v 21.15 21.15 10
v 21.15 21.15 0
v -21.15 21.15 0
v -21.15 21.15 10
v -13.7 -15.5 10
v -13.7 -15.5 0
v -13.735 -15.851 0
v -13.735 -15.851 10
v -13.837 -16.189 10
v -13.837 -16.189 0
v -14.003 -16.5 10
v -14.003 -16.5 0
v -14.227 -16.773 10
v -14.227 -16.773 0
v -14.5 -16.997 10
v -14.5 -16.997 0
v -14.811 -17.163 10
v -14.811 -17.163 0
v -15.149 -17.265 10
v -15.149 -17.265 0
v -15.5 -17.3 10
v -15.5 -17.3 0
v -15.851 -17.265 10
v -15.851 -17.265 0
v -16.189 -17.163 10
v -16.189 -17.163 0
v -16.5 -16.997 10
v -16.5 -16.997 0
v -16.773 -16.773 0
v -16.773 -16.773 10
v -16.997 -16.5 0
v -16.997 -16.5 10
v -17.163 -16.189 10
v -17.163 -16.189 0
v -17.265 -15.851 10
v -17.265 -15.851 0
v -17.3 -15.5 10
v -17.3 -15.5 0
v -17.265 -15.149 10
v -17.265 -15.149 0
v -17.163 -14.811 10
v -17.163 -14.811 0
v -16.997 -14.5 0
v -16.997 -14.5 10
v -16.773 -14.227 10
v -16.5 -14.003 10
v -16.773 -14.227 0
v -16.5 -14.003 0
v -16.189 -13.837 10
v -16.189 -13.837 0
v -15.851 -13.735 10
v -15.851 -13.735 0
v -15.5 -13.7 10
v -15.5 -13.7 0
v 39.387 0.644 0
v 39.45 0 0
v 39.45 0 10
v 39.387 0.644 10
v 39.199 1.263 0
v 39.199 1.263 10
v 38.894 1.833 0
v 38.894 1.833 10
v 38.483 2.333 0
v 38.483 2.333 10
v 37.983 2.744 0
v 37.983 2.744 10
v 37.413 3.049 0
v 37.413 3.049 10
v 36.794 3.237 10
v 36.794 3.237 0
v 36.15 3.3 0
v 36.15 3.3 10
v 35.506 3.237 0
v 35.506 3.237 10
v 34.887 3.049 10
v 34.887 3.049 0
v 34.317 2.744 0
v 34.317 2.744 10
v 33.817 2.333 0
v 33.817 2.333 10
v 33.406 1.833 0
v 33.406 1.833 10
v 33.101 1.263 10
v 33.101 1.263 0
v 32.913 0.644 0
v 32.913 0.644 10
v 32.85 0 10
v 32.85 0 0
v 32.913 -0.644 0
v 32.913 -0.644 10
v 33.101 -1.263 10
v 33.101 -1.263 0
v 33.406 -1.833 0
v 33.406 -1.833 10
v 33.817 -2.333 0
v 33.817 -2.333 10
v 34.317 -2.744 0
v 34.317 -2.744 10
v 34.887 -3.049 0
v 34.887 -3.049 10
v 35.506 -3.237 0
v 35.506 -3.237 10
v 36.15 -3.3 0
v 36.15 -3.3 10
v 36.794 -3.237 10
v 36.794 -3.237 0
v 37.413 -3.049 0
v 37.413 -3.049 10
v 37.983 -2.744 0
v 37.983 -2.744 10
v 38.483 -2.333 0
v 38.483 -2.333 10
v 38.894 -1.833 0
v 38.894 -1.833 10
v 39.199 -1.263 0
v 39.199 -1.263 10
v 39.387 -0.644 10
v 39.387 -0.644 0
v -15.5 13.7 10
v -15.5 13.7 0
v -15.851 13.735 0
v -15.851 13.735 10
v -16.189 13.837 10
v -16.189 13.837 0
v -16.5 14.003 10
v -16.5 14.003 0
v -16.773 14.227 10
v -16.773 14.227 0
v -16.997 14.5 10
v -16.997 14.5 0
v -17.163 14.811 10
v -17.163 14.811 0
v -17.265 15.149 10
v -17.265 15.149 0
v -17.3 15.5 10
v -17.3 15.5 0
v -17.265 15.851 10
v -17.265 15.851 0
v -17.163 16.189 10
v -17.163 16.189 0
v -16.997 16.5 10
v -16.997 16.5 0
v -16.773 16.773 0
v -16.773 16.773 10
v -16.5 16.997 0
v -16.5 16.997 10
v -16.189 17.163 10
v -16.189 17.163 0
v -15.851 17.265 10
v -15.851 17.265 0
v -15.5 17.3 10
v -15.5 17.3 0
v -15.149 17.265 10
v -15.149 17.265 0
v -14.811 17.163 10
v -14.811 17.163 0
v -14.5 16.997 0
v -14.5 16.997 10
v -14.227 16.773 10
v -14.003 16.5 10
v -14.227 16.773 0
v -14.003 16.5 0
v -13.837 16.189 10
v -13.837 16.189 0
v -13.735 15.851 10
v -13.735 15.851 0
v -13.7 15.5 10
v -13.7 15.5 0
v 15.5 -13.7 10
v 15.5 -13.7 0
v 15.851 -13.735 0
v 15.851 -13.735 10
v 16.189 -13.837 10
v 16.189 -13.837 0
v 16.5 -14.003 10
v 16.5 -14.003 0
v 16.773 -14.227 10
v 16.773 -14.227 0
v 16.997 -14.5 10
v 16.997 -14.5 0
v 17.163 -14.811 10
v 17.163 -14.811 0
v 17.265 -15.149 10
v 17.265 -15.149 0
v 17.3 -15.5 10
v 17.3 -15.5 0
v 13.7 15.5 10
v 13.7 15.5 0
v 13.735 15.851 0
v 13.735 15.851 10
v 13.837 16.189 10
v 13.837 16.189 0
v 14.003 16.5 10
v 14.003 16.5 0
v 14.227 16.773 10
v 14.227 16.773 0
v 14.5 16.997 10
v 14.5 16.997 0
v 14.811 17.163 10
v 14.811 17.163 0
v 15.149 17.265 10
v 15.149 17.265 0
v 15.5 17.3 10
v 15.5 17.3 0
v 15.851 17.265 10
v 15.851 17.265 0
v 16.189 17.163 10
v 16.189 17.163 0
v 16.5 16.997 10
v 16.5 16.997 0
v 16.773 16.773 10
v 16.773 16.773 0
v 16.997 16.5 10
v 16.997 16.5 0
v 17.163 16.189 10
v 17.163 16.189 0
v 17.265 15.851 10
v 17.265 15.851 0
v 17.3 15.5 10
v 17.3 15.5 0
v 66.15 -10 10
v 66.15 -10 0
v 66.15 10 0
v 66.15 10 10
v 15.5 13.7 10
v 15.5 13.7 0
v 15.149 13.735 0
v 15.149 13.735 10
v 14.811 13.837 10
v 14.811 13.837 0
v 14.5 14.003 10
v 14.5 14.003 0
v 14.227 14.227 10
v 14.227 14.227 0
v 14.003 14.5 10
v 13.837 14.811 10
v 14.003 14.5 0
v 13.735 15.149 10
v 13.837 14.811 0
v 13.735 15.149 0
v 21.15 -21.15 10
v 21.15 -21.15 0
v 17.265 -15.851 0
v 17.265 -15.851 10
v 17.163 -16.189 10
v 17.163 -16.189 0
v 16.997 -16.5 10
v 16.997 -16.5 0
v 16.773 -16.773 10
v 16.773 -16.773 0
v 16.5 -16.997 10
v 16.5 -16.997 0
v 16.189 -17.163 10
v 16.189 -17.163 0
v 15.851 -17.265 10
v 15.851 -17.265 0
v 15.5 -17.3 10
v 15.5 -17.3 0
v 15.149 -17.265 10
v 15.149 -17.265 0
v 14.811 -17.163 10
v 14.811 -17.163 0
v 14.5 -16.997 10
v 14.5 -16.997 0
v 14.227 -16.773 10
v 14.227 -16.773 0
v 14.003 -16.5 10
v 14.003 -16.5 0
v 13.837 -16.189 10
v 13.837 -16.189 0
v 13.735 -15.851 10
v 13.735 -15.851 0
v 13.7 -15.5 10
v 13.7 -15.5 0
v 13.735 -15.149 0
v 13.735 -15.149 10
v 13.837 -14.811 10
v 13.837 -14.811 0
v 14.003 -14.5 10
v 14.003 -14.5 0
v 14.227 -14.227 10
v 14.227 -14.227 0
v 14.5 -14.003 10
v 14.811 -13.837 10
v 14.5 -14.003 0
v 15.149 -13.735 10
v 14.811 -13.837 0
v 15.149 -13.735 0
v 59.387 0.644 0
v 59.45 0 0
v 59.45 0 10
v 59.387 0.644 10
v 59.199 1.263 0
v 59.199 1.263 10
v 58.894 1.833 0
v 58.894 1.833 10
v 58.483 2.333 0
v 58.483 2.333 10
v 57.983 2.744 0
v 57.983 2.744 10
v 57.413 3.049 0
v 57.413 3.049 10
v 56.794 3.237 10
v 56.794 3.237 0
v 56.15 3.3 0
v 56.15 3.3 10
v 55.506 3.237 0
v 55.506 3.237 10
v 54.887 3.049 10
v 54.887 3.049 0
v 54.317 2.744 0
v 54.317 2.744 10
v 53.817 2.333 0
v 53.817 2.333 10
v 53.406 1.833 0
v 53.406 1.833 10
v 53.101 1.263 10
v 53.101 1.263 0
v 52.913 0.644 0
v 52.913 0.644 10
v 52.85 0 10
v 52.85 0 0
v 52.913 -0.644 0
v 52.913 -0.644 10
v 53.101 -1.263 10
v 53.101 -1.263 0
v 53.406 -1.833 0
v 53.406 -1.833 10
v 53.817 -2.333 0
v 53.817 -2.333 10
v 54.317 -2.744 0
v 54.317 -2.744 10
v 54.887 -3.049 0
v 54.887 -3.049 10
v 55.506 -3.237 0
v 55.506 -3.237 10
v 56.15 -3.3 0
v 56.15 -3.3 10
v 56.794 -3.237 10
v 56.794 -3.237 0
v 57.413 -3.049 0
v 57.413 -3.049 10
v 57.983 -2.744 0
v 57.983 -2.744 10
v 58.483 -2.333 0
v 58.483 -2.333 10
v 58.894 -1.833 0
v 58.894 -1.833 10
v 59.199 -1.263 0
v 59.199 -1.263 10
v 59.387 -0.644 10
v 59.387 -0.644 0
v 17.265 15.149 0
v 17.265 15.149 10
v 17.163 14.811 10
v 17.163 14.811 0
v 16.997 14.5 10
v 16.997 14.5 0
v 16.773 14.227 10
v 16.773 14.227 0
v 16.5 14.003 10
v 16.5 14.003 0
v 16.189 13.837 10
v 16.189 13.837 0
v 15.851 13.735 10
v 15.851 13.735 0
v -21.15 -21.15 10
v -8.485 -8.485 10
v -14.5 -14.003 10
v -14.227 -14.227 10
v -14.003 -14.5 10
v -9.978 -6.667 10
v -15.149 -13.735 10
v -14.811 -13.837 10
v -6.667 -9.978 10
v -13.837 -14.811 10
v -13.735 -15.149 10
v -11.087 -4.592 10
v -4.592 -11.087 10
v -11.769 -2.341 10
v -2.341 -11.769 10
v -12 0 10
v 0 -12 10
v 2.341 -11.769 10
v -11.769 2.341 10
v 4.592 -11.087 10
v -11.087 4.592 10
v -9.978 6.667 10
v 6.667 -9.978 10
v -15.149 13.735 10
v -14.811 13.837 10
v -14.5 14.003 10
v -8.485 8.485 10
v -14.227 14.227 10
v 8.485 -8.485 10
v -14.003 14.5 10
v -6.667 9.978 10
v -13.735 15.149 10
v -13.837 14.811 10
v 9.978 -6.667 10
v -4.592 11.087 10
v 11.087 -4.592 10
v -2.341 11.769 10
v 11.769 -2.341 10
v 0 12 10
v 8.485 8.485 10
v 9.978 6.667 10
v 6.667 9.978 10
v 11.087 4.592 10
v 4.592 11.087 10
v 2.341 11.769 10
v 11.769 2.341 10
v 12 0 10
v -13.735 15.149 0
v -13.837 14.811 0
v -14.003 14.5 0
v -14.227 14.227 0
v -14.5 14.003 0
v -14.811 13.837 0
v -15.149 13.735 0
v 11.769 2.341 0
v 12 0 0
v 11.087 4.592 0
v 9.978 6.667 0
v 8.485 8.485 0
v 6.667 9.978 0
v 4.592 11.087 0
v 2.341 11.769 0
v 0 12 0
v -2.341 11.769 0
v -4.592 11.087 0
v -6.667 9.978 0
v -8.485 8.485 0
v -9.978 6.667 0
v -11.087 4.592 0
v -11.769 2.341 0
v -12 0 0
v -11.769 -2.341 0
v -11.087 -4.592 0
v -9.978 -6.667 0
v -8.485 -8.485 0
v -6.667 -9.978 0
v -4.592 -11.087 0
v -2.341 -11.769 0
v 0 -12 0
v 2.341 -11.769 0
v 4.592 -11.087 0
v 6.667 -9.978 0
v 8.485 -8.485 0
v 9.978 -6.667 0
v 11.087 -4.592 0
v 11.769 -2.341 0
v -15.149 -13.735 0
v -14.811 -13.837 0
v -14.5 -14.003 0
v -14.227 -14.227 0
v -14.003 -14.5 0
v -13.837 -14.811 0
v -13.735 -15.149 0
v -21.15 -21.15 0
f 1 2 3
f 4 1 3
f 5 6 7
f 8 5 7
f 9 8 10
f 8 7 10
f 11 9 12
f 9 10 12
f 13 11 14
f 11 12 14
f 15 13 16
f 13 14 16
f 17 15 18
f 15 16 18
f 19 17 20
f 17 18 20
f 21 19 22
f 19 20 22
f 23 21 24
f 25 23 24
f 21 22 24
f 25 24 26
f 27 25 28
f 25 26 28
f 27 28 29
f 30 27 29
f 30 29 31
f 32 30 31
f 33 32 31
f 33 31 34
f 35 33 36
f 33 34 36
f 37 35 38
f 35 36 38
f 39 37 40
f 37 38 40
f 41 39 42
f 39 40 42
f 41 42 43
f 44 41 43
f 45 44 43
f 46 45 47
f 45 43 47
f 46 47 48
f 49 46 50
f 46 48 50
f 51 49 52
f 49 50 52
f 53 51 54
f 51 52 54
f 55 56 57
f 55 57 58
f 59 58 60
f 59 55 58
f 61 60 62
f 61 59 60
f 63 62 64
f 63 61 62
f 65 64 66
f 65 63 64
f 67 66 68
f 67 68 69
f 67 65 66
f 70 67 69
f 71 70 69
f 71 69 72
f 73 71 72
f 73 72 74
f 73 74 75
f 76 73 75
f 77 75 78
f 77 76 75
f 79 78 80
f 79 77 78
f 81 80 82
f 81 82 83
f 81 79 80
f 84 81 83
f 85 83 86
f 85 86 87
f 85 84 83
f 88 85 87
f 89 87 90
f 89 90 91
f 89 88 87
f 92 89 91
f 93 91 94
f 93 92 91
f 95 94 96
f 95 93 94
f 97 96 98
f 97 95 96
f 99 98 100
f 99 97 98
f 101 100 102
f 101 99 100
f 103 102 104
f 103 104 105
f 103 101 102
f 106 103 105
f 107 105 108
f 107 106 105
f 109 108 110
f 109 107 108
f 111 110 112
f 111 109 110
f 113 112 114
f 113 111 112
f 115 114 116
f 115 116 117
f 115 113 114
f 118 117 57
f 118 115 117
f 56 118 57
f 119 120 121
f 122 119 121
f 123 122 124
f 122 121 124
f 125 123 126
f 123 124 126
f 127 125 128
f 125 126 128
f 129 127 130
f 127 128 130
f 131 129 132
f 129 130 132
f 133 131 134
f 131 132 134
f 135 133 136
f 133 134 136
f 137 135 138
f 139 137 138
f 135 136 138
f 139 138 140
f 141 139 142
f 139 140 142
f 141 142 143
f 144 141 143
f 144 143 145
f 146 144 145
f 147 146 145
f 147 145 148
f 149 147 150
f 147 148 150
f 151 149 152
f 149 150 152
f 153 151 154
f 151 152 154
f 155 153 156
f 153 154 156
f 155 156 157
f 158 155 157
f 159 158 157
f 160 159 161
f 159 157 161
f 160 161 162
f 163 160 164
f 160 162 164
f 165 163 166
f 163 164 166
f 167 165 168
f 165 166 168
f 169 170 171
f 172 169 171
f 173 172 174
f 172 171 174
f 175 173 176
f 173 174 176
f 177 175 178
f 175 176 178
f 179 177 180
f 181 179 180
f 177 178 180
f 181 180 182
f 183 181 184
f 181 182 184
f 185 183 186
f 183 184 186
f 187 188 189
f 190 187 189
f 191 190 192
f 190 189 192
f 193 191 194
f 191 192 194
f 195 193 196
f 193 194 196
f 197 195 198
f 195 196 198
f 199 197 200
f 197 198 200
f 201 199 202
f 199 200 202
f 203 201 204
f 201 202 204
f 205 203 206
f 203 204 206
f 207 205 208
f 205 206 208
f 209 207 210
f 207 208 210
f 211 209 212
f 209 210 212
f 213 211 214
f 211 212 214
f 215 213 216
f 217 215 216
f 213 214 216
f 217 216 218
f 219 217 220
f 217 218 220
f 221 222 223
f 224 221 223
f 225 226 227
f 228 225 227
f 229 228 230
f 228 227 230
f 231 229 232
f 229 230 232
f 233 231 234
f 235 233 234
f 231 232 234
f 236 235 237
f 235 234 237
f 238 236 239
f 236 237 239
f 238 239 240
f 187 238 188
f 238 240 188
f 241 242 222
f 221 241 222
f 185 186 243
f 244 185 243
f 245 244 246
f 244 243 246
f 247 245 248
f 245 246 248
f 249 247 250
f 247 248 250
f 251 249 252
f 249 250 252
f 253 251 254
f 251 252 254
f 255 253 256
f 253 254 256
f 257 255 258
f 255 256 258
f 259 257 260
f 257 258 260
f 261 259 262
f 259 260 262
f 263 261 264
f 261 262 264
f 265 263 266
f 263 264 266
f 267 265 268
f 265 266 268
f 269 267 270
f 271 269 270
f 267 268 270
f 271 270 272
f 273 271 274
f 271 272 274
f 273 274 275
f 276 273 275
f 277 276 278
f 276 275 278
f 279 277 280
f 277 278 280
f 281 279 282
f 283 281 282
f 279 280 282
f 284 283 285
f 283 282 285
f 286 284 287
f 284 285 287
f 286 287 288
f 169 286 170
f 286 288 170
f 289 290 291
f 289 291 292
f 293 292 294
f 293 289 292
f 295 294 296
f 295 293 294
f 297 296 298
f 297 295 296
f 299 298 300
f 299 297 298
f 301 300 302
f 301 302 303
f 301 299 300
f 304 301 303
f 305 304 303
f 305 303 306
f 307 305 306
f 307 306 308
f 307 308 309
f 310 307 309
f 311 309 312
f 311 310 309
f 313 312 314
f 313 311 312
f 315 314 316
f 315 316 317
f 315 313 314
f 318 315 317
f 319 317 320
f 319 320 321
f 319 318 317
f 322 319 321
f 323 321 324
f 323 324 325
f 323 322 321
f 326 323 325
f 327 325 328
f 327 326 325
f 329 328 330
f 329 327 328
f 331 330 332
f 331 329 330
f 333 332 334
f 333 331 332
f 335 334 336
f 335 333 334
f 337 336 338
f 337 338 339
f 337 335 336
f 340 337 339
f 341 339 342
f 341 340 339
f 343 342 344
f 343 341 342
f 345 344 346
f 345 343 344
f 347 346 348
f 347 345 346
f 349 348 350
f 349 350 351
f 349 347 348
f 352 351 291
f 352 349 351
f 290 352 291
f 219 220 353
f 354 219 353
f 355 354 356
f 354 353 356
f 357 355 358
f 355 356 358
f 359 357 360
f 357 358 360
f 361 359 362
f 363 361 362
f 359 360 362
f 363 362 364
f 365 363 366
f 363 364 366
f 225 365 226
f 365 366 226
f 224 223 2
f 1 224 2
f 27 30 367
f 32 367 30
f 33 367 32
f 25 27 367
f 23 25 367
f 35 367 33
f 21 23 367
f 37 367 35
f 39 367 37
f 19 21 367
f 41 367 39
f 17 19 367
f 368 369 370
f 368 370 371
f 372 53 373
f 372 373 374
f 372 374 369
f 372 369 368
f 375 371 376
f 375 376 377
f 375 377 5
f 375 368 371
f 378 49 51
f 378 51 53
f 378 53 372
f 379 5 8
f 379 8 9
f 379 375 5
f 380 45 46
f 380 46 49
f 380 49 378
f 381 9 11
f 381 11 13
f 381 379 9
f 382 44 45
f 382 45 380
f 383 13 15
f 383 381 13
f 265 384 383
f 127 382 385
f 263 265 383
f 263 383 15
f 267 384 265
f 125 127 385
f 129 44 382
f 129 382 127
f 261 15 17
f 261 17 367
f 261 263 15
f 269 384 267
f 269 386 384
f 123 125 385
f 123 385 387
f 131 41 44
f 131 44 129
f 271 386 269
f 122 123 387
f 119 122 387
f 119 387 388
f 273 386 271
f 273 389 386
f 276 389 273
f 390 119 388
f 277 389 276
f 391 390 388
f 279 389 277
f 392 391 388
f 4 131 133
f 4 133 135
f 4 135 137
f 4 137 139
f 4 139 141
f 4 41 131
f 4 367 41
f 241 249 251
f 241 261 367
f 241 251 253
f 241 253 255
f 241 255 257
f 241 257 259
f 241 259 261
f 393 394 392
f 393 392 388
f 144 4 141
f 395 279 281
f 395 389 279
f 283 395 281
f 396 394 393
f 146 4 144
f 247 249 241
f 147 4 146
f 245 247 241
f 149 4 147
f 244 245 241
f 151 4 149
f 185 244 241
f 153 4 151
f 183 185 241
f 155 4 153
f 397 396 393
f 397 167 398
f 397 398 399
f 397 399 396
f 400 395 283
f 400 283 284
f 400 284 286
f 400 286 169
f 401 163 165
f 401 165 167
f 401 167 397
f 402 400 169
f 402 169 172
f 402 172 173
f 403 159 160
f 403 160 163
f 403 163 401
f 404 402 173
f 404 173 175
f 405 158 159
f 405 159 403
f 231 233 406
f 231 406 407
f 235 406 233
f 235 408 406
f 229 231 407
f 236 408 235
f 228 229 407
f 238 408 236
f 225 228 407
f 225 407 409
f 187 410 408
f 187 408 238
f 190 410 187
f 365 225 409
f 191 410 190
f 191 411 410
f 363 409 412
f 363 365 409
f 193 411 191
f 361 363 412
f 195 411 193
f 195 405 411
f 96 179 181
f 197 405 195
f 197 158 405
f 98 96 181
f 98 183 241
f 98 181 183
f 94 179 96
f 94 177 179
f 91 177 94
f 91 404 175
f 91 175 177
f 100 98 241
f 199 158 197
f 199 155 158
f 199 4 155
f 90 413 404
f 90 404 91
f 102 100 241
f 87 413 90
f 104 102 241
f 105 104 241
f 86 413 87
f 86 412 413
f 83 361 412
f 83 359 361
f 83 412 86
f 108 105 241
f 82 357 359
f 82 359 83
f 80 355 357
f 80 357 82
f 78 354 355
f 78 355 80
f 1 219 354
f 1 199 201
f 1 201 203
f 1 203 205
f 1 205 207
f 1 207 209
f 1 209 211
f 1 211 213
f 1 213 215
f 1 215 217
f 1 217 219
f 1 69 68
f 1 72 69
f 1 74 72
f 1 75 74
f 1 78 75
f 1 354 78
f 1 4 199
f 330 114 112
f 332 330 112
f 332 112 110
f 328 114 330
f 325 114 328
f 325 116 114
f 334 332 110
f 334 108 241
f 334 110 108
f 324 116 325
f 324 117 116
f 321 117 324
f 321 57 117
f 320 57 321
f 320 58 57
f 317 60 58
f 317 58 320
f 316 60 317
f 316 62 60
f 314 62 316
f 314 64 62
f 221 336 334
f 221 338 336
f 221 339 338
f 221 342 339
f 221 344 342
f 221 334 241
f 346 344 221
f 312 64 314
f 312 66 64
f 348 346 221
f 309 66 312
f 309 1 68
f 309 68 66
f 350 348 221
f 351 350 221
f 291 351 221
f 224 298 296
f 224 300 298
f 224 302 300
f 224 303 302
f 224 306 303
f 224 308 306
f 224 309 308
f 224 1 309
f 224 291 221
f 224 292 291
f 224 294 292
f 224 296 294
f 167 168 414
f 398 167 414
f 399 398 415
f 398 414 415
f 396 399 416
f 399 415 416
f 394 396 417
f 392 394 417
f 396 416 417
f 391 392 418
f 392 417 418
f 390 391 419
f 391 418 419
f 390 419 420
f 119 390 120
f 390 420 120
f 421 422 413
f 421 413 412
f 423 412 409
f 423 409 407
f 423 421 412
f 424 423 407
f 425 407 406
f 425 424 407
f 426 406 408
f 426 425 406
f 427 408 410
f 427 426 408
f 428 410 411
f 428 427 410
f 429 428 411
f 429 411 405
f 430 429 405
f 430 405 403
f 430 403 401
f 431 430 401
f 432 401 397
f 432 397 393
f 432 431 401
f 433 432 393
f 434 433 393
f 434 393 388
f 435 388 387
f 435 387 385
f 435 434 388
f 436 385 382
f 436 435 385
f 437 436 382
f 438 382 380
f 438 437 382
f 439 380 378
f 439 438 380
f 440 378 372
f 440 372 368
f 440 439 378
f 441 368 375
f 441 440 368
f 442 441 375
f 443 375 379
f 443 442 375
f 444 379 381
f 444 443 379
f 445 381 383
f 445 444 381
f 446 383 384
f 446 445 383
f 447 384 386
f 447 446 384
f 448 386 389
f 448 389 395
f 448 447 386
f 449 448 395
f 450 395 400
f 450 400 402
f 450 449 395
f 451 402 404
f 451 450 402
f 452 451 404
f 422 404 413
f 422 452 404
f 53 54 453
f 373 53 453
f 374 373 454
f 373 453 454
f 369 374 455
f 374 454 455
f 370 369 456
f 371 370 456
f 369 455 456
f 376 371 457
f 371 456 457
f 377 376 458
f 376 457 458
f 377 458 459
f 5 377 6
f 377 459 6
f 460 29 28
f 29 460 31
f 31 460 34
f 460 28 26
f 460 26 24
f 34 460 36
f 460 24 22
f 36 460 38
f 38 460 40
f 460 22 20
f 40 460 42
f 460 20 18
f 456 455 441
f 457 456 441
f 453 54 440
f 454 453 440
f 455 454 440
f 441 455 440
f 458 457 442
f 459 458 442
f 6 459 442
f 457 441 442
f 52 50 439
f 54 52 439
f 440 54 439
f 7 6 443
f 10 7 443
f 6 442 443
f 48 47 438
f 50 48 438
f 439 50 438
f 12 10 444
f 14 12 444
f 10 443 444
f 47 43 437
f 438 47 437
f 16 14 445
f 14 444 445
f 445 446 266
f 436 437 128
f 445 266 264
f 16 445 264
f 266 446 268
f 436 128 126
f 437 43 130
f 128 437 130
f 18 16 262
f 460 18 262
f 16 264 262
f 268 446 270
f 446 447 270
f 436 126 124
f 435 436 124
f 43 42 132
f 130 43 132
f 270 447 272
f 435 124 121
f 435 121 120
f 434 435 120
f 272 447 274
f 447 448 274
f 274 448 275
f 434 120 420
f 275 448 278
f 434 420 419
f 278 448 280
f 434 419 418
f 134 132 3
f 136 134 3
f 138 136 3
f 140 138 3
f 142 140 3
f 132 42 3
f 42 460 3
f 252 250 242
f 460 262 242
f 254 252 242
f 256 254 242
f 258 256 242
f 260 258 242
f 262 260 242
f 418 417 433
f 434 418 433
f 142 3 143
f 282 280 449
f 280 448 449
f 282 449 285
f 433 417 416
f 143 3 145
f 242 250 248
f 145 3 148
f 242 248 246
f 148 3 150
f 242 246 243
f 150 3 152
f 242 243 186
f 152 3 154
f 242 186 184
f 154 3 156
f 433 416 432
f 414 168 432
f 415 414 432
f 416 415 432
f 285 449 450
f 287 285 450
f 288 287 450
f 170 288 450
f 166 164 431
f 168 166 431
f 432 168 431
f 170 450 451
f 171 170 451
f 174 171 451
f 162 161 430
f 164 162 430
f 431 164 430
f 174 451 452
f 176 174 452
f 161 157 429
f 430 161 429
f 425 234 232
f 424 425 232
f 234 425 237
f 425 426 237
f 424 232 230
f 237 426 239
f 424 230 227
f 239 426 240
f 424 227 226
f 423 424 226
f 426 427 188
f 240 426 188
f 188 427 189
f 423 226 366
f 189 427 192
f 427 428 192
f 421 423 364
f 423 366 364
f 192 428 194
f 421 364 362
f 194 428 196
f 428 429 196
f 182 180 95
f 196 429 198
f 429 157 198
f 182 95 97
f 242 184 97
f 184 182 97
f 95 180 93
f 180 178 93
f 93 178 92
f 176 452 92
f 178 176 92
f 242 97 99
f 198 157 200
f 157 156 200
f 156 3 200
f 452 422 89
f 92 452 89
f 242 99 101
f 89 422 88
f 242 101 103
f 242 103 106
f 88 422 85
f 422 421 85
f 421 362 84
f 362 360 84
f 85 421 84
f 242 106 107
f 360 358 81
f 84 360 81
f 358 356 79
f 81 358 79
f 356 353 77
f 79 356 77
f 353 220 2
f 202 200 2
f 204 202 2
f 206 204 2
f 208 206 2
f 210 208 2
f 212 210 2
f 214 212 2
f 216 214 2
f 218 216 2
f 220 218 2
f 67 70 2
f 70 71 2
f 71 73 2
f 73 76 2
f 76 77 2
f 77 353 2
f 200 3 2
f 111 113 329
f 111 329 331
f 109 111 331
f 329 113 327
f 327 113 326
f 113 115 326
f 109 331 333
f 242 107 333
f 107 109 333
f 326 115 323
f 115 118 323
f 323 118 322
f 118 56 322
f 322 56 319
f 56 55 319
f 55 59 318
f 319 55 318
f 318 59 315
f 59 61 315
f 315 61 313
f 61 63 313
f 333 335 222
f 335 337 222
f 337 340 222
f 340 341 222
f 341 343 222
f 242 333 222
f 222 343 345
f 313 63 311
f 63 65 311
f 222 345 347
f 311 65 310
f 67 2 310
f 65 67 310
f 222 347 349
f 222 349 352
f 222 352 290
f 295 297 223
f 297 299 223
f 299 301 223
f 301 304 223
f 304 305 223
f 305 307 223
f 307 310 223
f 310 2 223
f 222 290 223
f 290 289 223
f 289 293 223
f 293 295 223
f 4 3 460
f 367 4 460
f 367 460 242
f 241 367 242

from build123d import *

# Parameters (mm, degrees)
F0_W     = 45
F0_H     = 20
F0_R     = 3.3
F0_R_2   = 12
F1_DEPTH = 10


with BuildPart() as f1:
    # F0 (on Top) → F1 (new body)
    with BuildSketch(Plane.XY):
        with Locations((43.65, 0)):
            Rectangle(F0_W, F0_H)
        with Locations((36.15, 0)):
            Circle(F0_R, mode=Mode.SUBTRACT)
        with Locations((56.15, 0)):
            Circle(F0_R, mode=Mode.SUBTRACT)
        Polygon((66.15, 10), (21.15, 21.15), (21.15, 10), align=None)
        Polygon((66.15, -10), (21.15, -10), (21.15, -21.15), align=None)
        Polygon((21.15, 10), (21.15, 21.15), (-21.15, 21.15), (-21.15, -21.15), (21.15, -21.15), (21.15, -10), align=None)
        with BuildLine():
            ThreePointArc((-15.5, 13.7), (-16.772792, 16.772792), (-13.7, 15.5))
            Line((-13.7, 15.5), (13.7, 15.5))
            ThreePointArc((13.7, 15.5), (15.5, 17.3), (17.3, 15.5))
            ThreePointArc((17.3, 15.5), (16.772792, 14.227208), (15.5, 13.7))
            Line((15.5, 13.7), (15.5, -13.7))
            ThreePointArc((15.5, -13.7), (16.772792, -14.227208), (17.3, -15.5))
            ThreePointArc((17.3, -15.5), (15.5, -17.3), (13.7, -15.5))
            Line((13.7, -15.5), (-13.7, -15.5))
            ThreePointArc((-13.7, -15.5), (-16.772792, -16.772792), (-15.5, -13.7))
            Line((-15.5, -13.7), (-15.5, 13.7))
        make_face(mode=Mode.SUBTRACT)
        with BuildLine():
            Line((13.7, 15.5), (-13.7, 15.5))
            ThreePointArc((-13.7, 15.5), (-14.227208, 14.227208), (-15.5, 13.7))
            Line((-15.5, 13.7), (-15.5, -13.7))
            ThreePointArc((-15.5, -13.7), (-14.227208, -14.227208), (-13.7, -15.5))
            Line((-13.7, -15.5), (13.7, -15.5))
            ThreePointArc((13.7, -15.5), (14.227208, -14.227208), (15.5, -13.7))
            Line((15.5, -13.7), (15.5, 13.7))
            ThreePointArc((15.5, 13.7), (14.227208, 14.227208), (13.7, 15.5))
        make_face()
        Circle(F0_R_2, mode=Mode.SUBTRACT)
    extrude(amount=F1_DEPTH)


solid = f1.part
